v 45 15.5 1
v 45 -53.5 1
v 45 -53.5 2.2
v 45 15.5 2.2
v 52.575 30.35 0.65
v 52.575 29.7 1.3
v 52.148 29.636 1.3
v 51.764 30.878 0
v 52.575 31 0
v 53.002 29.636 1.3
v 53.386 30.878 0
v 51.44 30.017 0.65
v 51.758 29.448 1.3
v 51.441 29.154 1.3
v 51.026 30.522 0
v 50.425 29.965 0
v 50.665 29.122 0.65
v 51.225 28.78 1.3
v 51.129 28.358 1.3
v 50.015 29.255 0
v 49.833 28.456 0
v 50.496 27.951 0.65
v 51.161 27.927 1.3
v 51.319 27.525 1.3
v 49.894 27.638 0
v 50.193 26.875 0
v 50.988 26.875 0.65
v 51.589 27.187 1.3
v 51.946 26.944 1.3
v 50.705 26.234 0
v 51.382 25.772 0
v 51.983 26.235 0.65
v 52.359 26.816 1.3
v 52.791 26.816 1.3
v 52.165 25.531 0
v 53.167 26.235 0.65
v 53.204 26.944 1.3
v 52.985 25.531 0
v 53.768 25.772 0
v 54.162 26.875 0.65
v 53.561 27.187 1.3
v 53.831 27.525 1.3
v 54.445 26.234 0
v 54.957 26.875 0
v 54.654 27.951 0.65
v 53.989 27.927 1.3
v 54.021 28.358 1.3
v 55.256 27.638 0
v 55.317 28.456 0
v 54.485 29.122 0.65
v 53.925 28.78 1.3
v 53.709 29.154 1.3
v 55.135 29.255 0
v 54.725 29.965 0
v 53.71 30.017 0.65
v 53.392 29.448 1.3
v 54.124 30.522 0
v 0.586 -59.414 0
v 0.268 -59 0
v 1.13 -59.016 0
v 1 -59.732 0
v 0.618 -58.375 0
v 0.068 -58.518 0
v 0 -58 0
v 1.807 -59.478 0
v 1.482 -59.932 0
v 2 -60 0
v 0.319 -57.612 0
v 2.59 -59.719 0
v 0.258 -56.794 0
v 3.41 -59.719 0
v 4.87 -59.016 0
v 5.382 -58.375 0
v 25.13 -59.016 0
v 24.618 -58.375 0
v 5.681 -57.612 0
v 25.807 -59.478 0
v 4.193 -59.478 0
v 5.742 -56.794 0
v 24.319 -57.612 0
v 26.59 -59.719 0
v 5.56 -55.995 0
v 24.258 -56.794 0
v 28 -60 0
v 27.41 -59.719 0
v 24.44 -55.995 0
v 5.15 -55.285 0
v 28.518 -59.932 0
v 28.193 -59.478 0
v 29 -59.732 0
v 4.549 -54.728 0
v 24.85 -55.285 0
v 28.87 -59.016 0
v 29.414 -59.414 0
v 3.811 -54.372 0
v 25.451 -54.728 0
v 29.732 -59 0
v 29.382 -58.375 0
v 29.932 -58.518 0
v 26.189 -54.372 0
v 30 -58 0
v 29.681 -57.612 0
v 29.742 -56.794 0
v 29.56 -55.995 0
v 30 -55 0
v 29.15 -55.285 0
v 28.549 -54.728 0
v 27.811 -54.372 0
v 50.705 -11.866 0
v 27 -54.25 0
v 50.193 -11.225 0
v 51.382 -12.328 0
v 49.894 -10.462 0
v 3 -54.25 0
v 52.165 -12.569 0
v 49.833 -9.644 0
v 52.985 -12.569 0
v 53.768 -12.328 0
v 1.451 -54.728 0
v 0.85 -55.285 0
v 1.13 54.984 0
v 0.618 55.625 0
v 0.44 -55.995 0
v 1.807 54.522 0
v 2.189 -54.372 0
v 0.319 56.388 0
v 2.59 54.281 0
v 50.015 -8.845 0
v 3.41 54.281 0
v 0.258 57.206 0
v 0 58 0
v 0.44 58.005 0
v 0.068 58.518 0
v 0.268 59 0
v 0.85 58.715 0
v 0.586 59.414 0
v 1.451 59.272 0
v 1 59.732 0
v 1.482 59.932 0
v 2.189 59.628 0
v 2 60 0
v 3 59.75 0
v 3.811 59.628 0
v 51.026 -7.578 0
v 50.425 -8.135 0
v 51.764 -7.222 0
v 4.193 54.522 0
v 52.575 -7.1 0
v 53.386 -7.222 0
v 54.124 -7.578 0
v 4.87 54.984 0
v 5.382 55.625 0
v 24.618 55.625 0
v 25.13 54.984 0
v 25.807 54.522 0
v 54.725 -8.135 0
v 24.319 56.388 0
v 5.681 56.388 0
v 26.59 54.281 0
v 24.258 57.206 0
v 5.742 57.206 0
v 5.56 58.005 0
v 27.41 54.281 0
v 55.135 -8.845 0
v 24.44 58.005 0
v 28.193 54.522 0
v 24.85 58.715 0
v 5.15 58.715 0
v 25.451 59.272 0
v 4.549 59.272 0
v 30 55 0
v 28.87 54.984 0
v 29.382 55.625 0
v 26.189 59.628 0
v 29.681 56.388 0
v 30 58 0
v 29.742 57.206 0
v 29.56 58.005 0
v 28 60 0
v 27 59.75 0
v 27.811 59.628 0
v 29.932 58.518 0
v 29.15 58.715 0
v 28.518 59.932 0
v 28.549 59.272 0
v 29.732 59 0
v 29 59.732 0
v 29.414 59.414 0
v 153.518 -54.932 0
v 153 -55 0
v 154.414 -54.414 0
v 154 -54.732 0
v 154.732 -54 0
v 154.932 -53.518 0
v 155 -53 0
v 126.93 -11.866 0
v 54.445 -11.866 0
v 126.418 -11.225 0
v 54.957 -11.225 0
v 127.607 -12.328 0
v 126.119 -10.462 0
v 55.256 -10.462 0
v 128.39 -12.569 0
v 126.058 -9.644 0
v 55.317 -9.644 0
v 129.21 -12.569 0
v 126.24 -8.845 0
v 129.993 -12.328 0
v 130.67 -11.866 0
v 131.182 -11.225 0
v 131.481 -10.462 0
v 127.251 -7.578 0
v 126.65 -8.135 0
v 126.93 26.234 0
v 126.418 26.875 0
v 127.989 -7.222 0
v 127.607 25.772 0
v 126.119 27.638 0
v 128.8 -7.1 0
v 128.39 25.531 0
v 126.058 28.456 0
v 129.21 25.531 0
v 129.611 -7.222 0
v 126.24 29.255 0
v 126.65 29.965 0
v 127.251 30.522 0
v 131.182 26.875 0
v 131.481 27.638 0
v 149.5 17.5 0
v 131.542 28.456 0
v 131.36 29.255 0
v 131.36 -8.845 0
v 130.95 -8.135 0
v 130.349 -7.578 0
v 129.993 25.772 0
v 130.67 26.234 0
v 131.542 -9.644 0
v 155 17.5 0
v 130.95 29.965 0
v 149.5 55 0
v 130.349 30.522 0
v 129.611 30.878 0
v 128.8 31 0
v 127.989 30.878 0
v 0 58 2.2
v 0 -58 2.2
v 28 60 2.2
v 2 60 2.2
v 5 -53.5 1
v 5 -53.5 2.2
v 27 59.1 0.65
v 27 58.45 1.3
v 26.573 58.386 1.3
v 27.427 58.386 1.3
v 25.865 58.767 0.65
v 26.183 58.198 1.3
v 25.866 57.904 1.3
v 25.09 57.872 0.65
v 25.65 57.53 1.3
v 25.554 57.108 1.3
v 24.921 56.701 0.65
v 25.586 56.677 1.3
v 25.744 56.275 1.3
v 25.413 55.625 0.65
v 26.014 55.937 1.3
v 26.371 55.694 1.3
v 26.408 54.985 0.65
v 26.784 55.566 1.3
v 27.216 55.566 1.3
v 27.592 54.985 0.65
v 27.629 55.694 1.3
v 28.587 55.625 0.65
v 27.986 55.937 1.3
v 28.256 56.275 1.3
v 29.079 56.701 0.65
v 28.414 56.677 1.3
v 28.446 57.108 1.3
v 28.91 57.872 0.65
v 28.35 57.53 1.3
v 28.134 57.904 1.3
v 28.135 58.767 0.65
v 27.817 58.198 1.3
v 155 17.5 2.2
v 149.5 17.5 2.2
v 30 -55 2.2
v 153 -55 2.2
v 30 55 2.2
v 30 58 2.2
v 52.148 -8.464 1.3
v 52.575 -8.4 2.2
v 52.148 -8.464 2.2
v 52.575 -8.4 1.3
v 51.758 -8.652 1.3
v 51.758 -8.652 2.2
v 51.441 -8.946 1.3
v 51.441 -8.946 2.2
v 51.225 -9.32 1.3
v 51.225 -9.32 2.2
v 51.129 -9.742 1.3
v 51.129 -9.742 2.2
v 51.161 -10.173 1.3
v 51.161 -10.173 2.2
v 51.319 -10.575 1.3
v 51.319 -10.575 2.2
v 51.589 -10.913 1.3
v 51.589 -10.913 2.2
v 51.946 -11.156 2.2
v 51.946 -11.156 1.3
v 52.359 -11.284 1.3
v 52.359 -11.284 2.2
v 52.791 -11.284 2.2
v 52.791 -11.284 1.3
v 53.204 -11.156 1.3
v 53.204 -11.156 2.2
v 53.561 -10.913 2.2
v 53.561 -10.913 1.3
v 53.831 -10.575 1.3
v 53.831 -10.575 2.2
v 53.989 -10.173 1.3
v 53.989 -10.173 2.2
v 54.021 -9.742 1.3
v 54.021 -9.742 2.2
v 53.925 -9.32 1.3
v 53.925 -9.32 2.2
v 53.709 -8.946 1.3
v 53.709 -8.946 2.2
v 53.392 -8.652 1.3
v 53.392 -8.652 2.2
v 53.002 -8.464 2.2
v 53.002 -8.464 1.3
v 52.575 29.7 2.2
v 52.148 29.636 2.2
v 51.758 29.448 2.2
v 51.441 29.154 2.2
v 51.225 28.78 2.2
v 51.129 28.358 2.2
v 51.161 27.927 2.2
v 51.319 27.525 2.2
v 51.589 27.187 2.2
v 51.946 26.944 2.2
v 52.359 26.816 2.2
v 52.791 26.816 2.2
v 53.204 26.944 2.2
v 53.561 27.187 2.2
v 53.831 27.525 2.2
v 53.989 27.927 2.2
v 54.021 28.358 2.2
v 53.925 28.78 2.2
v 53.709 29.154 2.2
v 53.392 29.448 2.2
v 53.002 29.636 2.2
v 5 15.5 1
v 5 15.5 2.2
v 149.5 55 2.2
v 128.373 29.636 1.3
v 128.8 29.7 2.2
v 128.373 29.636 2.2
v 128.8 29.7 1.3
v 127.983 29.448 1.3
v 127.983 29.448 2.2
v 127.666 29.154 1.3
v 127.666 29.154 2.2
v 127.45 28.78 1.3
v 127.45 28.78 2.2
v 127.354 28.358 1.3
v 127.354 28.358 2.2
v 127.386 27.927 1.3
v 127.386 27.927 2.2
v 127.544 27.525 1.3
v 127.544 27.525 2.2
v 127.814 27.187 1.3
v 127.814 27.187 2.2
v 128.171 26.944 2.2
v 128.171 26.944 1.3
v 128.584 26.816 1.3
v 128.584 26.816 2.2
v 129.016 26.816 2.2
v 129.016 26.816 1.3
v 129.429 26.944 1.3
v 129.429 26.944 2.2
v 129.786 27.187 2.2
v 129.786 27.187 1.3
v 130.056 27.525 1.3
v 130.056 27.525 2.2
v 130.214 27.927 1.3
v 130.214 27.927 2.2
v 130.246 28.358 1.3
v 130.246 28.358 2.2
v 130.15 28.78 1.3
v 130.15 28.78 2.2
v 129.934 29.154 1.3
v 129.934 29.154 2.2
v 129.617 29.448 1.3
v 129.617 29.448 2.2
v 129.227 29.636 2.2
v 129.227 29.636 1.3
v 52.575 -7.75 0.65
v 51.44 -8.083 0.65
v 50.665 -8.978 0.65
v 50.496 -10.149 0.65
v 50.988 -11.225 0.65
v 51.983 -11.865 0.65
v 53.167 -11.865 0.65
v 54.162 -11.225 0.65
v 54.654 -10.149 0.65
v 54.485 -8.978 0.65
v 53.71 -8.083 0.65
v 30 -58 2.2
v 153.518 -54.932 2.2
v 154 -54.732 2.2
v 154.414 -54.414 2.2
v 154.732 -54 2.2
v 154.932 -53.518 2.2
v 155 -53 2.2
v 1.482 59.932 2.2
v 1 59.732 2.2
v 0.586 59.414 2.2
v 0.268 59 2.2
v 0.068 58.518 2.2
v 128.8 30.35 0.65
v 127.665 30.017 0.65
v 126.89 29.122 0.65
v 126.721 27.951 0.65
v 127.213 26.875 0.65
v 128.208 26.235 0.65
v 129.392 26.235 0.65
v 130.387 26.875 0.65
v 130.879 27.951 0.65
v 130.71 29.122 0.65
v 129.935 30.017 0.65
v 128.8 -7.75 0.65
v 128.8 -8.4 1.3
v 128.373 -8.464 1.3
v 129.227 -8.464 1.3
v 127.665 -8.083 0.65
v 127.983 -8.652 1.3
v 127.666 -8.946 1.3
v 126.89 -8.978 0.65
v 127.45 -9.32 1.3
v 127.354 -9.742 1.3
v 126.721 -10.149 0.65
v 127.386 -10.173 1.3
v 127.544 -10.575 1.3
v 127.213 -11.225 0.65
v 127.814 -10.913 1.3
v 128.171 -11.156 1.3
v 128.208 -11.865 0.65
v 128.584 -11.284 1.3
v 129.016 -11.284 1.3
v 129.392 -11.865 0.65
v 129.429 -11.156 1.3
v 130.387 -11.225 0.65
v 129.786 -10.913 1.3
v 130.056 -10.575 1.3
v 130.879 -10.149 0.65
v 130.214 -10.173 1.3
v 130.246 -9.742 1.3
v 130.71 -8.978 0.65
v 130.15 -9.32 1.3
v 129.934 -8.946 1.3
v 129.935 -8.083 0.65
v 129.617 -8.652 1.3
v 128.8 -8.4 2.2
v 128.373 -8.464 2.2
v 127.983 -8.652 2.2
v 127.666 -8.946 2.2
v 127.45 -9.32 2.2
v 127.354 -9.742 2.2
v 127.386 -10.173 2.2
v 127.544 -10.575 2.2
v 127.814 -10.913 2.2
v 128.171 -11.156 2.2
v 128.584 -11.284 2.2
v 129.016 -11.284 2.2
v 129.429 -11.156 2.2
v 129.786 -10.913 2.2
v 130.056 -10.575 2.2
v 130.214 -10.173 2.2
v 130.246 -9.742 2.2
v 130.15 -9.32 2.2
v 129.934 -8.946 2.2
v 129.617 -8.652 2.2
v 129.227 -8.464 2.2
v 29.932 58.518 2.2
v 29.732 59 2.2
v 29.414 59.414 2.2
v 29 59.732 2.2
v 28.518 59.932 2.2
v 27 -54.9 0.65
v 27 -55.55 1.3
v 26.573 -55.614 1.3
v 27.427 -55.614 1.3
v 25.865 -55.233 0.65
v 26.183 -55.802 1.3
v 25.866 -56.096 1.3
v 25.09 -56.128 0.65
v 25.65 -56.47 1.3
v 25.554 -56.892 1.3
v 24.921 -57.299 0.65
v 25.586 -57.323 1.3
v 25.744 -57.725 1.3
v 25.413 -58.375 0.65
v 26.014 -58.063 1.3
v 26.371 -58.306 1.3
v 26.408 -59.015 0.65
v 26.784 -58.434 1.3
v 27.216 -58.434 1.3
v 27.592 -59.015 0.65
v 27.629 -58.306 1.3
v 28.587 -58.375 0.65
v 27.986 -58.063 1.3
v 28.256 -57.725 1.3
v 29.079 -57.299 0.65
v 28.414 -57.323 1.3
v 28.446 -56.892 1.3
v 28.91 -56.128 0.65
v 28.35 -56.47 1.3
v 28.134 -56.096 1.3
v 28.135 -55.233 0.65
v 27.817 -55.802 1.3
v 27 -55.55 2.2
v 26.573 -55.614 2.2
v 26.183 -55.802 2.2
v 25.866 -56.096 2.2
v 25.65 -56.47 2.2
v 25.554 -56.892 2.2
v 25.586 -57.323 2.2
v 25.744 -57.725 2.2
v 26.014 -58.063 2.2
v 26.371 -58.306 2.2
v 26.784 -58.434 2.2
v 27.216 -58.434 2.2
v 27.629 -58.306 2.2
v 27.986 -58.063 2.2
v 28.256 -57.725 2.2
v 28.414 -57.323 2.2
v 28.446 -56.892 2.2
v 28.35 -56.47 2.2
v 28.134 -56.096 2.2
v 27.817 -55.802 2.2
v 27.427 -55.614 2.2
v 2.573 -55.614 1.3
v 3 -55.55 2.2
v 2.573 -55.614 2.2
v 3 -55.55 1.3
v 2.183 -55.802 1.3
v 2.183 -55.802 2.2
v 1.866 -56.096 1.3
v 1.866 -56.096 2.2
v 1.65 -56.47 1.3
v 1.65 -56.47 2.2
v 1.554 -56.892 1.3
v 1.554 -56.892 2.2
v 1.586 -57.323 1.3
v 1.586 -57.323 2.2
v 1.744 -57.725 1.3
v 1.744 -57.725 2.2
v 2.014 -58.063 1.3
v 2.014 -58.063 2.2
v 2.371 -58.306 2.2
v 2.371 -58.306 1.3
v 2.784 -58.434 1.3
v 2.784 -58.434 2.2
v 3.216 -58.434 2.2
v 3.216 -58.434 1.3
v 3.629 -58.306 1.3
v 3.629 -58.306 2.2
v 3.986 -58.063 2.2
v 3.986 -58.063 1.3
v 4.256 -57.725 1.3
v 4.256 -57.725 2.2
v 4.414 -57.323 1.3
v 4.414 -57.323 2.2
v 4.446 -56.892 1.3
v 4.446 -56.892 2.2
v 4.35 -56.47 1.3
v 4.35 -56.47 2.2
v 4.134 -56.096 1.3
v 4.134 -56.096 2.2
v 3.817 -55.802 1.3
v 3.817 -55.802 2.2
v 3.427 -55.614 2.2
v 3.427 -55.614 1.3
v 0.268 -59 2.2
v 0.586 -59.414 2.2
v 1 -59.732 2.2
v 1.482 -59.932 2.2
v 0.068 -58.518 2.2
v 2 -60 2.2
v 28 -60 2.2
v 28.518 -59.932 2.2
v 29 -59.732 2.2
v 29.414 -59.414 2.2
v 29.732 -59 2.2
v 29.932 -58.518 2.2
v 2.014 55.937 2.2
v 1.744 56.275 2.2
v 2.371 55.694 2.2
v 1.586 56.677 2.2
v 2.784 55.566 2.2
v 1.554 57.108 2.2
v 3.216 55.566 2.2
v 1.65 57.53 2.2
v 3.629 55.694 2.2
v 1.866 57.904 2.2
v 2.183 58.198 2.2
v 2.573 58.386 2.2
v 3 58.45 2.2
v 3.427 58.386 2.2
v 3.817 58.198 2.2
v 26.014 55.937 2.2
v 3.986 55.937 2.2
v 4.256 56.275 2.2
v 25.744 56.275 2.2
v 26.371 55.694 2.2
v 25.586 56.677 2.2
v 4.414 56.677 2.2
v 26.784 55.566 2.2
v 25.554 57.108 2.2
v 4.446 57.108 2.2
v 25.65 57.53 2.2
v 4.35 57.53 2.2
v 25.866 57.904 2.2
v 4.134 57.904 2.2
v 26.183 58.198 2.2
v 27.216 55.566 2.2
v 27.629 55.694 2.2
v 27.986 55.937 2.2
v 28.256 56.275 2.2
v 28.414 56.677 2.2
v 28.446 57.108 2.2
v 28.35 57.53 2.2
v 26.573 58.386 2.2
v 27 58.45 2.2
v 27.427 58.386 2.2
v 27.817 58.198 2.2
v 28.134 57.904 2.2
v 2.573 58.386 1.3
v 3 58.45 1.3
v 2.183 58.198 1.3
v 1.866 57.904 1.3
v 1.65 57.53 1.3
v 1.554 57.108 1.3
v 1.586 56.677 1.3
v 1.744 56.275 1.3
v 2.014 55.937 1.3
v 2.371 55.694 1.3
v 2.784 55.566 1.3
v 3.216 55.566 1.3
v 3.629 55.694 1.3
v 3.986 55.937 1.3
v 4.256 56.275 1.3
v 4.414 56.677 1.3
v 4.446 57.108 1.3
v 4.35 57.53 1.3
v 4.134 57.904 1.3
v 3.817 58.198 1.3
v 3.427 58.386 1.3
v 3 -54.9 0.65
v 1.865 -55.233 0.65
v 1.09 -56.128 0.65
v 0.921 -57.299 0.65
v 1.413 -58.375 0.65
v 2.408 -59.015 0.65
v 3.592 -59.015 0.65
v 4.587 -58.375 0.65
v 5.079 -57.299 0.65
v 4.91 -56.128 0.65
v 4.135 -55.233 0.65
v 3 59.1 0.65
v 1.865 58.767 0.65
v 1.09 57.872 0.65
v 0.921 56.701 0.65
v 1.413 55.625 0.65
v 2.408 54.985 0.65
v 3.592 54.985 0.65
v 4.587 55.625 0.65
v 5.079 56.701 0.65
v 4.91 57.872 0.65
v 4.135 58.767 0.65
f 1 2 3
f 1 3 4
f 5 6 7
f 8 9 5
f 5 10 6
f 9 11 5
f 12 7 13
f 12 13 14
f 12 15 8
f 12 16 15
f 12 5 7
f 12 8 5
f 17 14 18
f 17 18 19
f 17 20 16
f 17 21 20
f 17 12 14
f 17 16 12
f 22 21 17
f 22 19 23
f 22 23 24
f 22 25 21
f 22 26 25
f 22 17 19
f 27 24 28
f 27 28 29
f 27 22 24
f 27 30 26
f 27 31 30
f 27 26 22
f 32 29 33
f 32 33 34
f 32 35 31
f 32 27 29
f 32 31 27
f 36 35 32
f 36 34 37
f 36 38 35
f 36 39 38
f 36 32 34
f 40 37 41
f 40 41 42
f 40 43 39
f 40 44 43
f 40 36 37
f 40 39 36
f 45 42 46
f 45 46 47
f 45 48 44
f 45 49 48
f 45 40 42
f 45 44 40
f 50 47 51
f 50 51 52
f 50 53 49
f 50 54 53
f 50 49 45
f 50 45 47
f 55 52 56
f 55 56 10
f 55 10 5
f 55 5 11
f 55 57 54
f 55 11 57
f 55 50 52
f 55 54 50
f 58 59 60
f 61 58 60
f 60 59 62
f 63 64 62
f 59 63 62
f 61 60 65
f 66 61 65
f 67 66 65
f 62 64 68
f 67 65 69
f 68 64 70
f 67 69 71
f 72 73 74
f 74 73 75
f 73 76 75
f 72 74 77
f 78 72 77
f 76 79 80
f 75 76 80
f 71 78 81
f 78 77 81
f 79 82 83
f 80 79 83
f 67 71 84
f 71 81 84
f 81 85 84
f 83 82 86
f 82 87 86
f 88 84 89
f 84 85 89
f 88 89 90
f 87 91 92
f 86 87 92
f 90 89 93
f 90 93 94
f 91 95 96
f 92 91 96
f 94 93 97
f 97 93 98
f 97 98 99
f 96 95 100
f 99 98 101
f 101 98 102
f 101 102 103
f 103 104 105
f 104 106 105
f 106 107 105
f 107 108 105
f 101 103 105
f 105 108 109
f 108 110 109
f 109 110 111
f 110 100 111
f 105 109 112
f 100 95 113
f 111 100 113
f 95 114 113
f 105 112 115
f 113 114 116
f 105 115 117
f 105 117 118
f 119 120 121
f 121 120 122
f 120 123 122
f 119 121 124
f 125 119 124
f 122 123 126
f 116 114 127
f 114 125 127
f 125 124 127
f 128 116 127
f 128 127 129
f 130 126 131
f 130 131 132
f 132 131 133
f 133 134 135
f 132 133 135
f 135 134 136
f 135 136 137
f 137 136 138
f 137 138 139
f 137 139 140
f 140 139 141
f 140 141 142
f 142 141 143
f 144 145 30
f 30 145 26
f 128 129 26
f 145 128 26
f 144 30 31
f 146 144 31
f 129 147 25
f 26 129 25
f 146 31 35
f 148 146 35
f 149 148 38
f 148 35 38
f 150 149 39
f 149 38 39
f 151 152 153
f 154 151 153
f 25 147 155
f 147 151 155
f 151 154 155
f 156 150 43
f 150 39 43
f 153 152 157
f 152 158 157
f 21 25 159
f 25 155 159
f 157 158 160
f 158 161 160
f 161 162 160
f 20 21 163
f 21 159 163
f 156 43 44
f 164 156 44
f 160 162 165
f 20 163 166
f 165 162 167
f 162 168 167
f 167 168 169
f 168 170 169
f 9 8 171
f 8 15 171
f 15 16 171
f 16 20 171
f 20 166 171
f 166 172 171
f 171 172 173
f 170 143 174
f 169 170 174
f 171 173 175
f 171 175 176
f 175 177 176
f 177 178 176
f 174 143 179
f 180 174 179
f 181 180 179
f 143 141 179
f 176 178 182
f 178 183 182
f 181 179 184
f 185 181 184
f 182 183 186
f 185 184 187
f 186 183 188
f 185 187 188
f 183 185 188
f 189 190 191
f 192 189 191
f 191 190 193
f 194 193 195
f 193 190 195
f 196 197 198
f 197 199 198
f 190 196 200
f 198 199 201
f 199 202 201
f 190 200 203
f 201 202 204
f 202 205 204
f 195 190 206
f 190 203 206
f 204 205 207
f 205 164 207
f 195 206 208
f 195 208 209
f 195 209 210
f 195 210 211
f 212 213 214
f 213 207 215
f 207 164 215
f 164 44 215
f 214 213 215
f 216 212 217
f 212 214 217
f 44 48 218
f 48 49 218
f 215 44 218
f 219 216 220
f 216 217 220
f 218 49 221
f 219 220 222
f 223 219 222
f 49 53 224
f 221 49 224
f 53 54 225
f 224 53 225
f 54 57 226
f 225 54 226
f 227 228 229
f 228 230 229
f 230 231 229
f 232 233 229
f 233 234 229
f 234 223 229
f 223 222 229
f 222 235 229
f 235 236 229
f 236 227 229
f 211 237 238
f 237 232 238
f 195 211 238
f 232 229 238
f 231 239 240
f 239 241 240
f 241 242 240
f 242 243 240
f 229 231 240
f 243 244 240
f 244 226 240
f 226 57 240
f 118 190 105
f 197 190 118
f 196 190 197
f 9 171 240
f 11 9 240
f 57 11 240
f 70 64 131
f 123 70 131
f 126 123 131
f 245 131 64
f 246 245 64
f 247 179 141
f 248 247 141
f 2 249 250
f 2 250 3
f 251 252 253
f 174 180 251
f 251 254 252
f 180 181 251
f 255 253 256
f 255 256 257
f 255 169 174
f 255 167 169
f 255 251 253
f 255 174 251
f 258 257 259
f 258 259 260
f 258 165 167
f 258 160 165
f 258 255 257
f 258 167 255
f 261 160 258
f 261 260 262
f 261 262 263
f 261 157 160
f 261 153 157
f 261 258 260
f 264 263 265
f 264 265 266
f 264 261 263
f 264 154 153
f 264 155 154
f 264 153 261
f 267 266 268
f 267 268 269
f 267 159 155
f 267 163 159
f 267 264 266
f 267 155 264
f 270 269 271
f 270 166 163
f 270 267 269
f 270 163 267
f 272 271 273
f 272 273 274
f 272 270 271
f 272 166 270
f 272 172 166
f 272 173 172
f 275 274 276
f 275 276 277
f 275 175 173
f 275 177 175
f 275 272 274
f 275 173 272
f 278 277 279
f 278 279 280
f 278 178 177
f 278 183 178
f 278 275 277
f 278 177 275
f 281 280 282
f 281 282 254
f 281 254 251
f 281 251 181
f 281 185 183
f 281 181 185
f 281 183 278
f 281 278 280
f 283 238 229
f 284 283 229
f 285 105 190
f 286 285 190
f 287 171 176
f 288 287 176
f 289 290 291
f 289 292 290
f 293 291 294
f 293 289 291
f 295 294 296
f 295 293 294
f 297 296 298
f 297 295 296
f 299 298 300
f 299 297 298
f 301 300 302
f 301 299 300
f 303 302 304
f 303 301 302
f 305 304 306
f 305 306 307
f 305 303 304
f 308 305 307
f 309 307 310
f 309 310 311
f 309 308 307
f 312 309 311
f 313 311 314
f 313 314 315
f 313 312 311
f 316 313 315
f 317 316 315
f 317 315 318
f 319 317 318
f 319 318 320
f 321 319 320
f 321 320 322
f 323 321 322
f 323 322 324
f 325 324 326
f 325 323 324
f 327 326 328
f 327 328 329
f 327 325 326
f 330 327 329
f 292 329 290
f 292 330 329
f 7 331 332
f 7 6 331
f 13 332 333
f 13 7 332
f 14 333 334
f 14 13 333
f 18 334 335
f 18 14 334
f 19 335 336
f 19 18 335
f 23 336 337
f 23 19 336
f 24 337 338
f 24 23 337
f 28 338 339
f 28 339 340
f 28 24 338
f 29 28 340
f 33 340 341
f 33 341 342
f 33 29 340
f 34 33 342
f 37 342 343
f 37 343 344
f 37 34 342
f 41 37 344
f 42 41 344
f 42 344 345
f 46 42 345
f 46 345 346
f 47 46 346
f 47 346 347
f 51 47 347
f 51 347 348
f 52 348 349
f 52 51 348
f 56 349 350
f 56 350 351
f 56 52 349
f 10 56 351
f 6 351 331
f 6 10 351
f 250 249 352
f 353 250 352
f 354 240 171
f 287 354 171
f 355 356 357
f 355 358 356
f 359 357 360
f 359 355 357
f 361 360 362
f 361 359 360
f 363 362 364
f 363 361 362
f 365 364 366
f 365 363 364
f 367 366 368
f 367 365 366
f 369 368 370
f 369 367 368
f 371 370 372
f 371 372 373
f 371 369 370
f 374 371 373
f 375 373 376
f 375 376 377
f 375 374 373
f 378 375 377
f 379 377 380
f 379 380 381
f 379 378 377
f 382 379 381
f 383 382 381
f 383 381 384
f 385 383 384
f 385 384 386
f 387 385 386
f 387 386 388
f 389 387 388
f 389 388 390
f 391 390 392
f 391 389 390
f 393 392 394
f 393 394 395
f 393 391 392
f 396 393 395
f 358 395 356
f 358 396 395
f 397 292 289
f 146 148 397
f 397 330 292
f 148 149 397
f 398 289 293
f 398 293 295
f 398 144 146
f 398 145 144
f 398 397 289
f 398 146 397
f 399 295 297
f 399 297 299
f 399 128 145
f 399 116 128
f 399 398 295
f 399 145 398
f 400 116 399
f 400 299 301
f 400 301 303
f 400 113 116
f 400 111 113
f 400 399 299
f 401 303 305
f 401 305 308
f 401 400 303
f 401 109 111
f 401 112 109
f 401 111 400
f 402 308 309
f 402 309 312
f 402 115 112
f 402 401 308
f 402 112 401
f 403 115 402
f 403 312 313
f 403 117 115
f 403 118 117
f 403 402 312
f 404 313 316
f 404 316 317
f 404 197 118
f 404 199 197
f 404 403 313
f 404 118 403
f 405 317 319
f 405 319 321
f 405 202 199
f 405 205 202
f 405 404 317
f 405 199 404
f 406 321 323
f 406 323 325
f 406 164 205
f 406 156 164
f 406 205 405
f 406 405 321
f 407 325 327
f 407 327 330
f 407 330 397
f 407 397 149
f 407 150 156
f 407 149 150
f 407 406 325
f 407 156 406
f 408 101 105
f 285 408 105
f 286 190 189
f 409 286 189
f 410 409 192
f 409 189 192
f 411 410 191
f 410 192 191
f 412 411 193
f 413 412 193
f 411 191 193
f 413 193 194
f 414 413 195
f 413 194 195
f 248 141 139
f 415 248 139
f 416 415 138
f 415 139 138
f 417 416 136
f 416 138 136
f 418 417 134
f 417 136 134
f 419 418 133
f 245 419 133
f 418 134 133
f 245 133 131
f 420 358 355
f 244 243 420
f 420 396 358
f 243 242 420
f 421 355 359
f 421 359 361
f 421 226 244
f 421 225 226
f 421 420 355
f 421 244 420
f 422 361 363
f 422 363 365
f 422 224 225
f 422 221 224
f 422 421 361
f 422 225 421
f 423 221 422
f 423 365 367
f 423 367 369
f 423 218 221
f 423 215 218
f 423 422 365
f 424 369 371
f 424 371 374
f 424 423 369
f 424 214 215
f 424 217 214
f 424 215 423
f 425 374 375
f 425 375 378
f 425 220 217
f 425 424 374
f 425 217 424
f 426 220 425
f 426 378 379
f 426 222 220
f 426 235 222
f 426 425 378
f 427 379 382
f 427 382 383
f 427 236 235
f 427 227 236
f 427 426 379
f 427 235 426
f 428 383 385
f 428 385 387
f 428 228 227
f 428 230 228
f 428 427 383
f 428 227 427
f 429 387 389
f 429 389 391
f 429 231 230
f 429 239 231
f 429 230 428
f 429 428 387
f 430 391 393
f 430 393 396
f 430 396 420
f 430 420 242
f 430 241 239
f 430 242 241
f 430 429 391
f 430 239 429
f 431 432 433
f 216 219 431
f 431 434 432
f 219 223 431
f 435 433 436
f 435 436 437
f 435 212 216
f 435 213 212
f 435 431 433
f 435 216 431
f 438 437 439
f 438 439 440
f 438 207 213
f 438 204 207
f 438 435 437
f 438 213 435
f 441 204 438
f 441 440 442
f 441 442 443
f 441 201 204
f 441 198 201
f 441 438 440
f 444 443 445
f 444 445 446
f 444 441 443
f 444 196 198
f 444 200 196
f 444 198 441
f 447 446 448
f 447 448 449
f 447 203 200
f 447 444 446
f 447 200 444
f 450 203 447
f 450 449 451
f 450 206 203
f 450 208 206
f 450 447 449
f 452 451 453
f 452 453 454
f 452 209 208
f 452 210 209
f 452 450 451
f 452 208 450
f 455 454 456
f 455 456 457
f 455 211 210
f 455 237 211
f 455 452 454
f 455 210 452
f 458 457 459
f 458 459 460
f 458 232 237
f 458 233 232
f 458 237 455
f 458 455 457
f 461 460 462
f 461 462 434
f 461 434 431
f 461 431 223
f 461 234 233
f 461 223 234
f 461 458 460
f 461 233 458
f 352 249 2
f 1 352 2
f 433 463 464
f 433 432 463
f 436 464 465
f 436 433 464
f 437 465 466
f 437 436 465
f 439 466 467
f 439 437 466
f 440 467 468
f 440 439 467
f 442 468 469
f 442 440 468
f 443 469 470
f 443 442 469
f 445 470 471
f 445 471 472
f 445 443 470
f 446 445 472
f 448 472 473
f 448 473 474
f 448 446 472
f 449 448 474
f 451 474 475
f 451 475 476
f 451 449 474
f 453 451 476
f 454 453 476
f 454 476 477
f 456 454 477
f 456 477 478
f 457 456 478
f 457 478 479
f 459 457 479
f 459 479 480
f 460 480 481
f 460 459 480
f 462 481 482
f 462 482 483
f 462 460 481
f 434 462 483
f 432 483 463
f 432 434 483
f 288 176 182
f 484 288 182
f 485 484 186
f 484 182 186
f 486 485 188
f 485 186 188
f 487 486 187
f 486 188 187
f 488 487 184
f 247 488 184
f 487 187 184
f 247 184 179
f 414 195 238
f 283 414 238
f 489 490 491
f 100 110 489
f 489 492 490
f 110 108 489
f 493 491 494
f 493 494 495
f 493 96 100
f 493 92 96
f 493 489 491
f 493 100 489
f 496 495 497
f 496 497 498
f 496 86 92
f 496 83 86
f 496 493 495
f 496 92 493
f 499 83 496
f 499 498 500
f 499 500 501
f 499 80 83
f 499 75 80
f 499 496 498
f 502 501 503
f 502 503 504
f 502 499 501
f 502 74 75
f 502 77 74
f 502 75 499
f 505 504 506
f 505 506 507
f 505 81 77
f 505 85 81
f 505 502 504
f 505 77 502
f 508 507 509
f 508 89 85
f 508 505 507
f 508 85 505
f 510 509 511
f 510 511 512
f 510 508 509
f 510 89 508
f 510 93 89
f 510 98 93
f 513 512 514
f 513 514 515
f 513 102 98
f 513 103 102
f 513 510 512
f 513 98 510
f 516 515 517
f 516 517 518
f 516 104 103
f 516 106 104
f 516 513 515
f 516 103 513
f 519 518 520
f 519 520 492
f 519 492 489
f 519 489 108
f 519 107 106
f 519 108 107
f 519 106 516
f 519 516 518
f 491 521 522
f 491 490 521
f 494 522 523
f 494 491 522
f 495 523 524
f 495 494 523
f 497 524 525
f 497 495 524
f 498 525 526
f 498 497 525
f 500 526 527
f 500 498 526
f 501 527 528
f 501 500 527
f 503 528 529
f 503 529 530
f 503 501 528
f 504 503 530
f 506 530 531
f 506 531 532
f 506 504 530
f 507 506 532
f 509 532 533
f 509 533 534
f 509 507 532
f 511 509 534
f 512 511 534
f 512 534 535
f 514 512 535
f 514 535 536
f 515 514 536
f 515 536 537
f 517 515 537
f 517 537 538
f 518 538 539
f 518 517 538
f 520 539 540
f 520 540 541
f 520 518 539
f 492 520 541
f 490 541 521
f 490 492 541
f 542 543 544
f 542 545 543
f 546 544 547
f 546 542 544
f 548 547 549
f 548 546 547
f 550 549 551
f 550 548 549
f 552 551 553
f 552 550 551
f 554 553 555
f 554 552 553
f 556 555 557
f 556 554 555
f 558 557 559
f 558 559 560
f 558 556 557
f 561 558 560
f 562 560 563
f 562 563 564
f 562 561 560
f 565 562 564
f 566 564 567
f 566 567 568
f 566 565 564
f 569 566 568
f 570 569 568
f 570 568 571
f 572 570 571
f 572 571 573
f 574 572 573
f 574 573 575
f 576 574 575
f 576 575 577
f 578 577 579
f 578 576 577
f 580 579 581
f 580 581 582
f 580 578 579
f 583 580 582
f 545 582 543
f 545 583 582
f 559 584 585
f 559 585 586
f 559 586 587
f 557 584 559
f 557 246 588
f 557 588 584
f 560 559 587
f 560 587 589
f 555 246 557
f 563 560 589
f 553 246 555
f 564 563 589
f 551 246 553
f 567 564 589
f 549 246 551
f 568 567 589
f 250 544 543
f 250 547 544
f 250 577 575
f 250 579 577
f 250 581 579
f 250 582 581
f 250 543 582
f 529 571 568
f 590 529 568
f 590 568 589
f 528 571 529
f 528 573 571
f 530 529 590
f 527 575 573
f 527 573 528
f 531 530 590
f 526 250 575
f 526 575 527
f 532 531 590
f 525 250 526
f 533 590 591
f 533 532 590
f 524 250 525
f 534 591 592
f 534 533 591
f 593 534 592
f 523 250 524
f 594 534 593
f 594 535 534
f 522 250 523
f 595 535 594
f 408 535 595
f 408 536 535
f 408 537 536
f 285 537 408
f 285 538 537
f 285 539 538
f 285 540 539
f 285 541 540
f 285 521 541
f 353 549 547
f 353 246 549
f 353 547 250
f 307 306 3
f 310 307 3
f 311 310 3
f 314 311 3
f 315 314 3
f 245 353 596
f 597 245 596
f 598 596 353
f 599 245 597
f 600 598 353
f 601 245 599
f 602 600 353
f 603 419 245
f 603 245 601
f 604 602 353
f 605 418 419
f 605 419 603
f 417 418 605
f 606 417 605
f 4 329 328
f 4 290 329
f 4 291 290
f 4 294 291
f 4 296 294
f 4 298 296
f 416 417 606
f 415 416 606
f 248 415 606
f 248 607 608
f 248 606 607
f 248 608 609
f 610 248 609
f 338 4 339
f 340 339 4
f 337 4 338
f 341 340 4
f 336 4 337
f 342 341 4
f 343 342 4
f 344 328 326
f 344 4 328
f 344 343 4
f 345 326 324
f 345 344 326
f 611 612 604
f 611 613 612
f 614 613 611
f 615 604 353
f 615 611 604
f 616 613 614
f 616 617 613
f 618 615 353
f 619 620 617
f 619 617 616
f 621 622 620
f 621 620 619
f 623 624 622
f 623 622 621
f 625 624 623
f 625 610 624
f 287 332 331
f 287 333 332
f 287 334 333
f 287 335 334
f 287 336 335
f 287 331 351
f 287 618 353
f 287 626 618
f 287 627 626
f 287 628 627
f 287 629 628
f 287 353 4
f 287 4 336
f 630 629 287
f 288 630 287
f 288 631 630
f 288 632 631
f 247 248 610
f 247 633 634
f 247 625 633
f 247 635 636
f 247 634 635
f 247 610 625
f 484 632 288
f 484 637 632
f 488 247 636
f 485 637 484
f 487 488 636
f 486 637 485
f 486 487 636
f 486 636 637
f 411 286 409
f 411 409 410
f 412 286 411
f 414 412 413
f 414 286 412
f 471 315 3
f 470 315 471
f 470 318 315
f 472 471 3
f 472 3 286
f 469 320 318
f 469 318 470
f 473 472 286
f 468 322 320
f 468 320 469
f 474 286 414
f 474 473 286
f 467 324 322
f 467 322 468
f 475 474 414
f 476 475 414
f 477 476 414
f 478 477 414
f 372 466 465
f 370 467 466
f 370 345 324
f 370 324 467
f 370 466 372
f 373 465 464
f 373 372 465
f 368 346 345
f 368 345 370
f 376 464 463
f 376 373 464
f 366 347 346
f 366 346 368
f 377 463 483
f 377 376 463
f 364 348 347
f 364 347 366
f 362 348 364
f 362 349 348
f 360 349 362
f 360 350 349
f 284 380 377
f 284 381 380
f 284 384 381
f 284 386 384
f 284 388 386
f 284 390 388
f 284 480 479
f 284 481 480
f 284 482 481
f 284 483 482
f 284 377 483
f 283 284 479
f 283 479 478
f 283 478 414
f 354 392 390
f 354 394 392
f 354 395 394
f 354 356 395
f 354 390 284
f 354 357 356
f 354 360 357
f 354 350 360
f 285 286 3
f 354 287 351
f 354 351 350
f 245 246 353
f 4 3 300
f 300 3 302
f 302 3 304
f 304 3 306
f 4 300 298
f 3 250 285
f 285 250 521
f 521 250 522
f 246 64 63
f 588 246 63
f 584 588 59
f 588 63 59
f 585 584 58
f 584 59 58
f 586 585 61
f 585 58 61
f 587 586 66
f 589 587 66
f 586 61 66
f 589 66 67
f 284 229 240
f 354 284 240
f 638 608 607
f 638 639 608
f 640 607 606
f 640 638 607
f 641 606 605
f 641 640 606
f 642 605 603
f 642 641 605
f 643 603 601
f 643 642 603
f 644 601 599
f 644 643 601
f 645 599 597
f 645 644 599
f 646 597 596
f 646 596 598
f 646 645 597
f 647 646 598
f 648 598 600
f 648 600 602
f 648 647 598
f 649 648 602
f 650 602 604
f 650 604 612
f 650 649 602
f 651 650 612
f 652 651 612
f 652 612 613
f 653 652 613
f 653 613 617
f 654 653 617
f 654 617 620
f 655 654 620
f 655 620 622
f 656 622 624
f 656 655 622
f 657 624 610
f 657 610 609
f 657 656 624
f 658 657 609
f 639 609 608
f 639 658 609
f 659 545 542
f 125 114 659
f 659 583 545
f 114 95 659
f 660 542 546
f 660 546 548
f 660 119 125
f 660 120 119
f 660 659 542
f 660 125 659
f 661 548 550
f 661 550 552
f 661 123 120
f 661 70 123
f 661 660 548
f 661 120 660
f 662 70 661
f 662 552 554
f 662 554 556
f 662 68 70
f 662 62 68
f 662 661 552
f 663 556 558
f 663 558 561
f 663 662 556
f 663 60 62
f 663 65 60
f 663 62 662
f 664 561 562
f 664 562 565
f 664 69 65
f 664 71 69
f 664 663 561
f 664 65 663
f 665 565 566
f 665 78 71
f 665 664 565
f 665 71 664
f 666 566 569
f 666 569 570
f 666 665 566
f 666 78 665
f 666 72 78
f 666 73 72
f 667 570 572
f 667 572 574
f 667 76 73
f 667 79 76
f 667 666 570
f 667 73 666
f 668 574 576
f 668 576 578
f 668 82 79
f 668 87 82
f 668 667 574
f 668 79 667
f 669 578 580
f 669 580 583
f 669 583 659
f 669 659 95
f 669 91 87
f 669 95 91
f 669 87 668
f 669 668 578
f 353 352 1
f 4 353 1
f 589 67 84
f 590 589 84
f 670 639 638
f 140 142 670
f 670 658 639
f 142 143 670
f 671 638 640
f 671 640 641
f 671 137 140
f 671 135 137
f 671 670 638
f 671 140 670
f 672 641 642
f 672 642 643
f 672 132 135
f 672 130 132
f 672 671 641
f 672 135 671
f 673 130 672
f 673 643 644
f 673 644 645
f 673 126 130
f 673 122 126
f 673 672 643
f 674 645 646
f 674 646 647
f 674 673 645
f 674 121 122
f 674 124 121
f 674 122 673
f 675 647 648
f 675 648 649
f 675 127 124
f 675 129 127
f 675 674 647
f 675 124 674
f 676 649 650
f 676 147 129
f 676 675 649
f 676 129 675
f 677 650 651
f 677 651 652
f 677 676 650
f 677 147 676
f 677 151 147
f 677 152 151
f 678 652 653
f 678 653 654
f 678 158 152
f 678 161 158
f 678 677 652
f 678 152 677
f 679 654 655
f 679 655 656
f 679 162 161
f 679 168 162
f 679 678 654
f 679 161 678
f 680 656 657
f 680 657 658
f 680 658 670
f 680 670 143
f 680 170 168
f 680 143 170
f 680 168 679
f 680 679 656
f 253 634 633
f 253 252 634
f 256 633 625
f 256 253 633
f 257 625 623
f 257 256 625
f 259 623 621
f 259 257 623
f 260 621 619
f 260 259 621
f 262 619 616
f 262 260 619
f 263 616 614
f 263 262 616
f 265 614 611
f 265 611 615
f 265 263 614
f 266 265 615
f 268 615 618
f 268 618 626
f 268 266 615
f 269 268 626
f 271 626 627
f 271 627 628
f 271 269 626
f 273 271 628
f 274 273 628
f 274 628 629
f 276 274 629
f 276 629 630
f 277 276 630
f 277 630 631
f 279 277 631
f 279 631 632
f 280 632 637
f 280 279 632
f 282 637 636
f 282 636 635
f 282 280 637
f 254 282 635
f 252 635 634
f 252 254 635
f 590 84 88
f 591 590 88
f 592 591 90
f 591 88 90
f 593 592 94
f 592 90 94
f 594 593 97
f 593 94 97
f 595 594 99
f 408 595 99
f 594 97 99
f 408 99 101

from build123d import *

# Parameters (mm, degrees)
BOSS_EXTRUDE1_DEPTH                            = 2.2
CSK_FOR_M2_5_COUNTERSUNK_FLAT_HEAD_S_2_COUNT   = 2
CSK_FOR_M2_5_COUNTERSUNK_FLAT_HEAD_S_2_PITCH   = 76.225
CSK_FOR_M2_5_COUNTERSUNK_FLAT_HEAD_S_3_COUNT   = 2
CSK_FOR_M2_5_COUNTERSUNK_FLAT_HEAD_S_3_PITCH   = 85.216551356
CSK_FOR_M2_5_COUNTERSUNK_FLAT_HEAD_S_4_COUNT   = 2
CSK_FOR_M2_5_COUNTERSUNK_FLAT_HEAD_S_4_PITCH   = 38.1
CSK_FOR_M2_5_COUNTERSUNK_FLAT_HEAD_S_5_A_COUNT = 2
CSK_FOR_M2_5_COUNTERSUNK_FLAT_HEAD_S_5_A_PITCH = 24
CSK_FOR_M2_5_COUNTERSUNK_FLAT_HEAD_S_6_COUNT   = 2
CSK_FOR_M2_5_COUNTERSUNK_FLAT_HEAD_S_6_PITCH   = 114
CSK_FOR_M2_5_COUNTERSUNK_FLAT_HEAD_S_7_COUNT   = 2
CSK_FOR_M2_5_COUNTERSUNK_FLAT_HEAD_S_7_PITCH   = 116.498927034
CUT_EXTRUDE1_DEPTH                             = 167.222260844
CUT_EXTRUDE1_DEPTH_BACK                        = 1.2
SKETCH4_W                                      = 40
SKETCH4_H                                      = 69


with BuildPart() as part:
    # Sketch1 → Boss-Extrude1 (new body)
    with BuildSketch(Plane.XY):
        with BuildLine():
            Line((2, -60), (28, -60))
            ThreePointArc((28, -60), (29.414213562, -59.414213562), (30, -58))
            Line((30, -58), (30, -55))
            Line((30, -55), (153, -55))
            ThreePointArc((153, -55), (154.414213562, -54.414213562), (155, -53))
            Line((155, -53), (155, 17.5))
            Line((155, 17.5), (149.5, 17.5))
            Line((149.5, 17.5), (149.5, 55))
            Line((149.5, 55), (30, 55))
            Line((30, 55), (30, 58))
            ThreePointArc((30, 58), (29.414213562, 59.414213562), (28, 60))
            Line((28, 60), (2, 60))
            ThreePointArc((2, 60), (0.585786438, 59.414213562), (0, 58))
            Line((0, 58), (0, -58))
            ThreePointArc((0, -58), (0.585786438, -59.414213562), (2, -60))
        make_face()
    extrude(amount=BOSS_EXTRUDE1_DEPTH)

    # Sketch2 → CSK for M2.5 Countersunk Flat Head Screw (revolve, cut)
    with BuildSketch(Plane(origin=(52.575, 28.25, 0), x_dir=(0, 1, 0), z_dir=(1, 0, 0))):
        Polygon((0, 0), (0, 2.2), (1.45, 2.2), (1.45, 1.3), (2.75, 0), align=None)
    csk_for_m2_5_countersunk_flat_head_screw = revolve(axis=Axis((52.575, 28.25, -6.35), (0, 0, 1)), mode=Mode.SUBTRACT)

    # CSK for M2.5 Countersunk Flat Head S 2: CSK for M2.5 Countersunk Flat Head Screw ×2
    with Locations(*[(i * CSK_FOR_M2_5_COUNTERSUNK_FLAT_HEAD_S_2_PITCH, 0, 0) for i in range(1, CSK_FOR_M2_5_COUNTERSUNK_FLAT_HEAD_S_2_COUNT)]):
        add(csk_for_m2_5_countersunk_flat_head_screw, mode=Mode.SUBTRACT)

    # CSK for M2.5 Countersunk Flat Head S 3: CSK for M2.5 Countersunk Flat Head Screw ×2
    with Locations(*[Vector(0.8944858573496409, -0.4470962435555436, 0) * (i * CSK_FOR_M2_5_COUNTERSUNK_FLAT_HEAD_S_3_PITCH) for i in range(1, CSK_FOR_M2_5_COUNTERSUNK_FLAT_HEAD_S_3_COUNT)]):
        add(csk_for_m2_5_countersunk_flat_head_screw, mode=Mode.SUBTRACT)

    # CSK for M2.5 Countersunk Flat Head S 4: CSK for M2.5 Countersunk Flat Head Screw ×2
    with Locations(*[(0, -i * CSK_FOR_M2_5_COUNTERSUNK_FLAT_HEAD_S_4_PITCH, 0) for i in range(1, CSK_FOR_M2_5_COUNTERSUNK_FLAT_HEAD_S_4_COUNT)]):
        add(csk_for_m2_5_countersunk_flat_head_screw, mode=Mode.SUBTRACT)

    # Sketch3 → CSK for M2.5 Countersunk Flat Head S 5 (revolve, cut)
    with BuildSketch(Plane(origin=(27, 57, 0), x_dir=(0, 1, 0), z_dir=(1, 0, 0))):
        Polygon((0, 0), (0, 2.2), (1.45, 2.2), (1.45, 1.3), (2.75, 0), align=None)
    csk_for_m2_5_countersunk_flat_head_s_5 = revolve(axis=Axis((27, 57, -6.35), (0, 0, 1)), mode=Mode.SUBTRACT)

    # CSK for M2.5 Countersunk Flat Head S 5 a: CSK for M2.5 Countersunk Flat Head S 5 ×2
    with Locations(*[(-i * CSK_FOR_M2_5_COUNTERSUNK_FLAT_HEAD_S_5_A_PITCH, 0, 0) for i in range(1, CSK_FOR_M2_5_COUNTERSUNK_FLAT_HEAD_S_5_A_COUNT)]):
        add(csk_for_m2_5_countersunk_flat_head_s_5, mode=Mode.SUBTRACT)

    # CSK for M2.5 Countersunk Flat Head S 6: CSK for M2.5 Countersunk Flat Head S 5 ×2
    with Locations(*[(0, -i * CSK_FOR_M2_5_COUNTERSUNK_FLAT_HEAD_S_6_PITCH, 0) for i in range(1, CSK_FOR_M2_5_COUNTERSUNK_FLAT_HEAD_S_6_COUNT)]):
        add(csk_for_m2_5_countersunk_flat_head_s_5, mode=Mode.SUBTRACT)

    # CSK for M2.5 Countersunk Flat Head S 7: CSK for M2.5 Countersunk Flat Head S 5 ×2
    with Locations(*[Vector(-0.206010481049842, -0.978549784986749, 0) * (i * CSK_FOR_M2_5_COUNTERSUNK_FLAT_HEAD_S_7_PITCH) for i in range(1, CSK_FOR_M2_5_COUNTERSUNK_FLAT_HEAD_S_7_COUNT)]):
        add(csk_for_m2_5_countersunk_flat_head_s_5, mode=Mode.SUBTRACT)

    # Sketch4 → Cut-Extrude1 (cut, two sides: drawn at the far end of the back side and taken through both)
    with BuildSketch(Plane.XY.offset(2.2).offset(-CUT_EXTRUDE1_DEPTH_BACK)):
        with Locations((25, -19)):
            Rectangle(SKETCH4_W, SKETCH4_H)
    extrude(amount=CUT_EXTRUDE1_DEPTH + CUT_EXTRUDE1_DEPTH_BACK, mode=Mode.SUBTRACT)


solid = part.part
